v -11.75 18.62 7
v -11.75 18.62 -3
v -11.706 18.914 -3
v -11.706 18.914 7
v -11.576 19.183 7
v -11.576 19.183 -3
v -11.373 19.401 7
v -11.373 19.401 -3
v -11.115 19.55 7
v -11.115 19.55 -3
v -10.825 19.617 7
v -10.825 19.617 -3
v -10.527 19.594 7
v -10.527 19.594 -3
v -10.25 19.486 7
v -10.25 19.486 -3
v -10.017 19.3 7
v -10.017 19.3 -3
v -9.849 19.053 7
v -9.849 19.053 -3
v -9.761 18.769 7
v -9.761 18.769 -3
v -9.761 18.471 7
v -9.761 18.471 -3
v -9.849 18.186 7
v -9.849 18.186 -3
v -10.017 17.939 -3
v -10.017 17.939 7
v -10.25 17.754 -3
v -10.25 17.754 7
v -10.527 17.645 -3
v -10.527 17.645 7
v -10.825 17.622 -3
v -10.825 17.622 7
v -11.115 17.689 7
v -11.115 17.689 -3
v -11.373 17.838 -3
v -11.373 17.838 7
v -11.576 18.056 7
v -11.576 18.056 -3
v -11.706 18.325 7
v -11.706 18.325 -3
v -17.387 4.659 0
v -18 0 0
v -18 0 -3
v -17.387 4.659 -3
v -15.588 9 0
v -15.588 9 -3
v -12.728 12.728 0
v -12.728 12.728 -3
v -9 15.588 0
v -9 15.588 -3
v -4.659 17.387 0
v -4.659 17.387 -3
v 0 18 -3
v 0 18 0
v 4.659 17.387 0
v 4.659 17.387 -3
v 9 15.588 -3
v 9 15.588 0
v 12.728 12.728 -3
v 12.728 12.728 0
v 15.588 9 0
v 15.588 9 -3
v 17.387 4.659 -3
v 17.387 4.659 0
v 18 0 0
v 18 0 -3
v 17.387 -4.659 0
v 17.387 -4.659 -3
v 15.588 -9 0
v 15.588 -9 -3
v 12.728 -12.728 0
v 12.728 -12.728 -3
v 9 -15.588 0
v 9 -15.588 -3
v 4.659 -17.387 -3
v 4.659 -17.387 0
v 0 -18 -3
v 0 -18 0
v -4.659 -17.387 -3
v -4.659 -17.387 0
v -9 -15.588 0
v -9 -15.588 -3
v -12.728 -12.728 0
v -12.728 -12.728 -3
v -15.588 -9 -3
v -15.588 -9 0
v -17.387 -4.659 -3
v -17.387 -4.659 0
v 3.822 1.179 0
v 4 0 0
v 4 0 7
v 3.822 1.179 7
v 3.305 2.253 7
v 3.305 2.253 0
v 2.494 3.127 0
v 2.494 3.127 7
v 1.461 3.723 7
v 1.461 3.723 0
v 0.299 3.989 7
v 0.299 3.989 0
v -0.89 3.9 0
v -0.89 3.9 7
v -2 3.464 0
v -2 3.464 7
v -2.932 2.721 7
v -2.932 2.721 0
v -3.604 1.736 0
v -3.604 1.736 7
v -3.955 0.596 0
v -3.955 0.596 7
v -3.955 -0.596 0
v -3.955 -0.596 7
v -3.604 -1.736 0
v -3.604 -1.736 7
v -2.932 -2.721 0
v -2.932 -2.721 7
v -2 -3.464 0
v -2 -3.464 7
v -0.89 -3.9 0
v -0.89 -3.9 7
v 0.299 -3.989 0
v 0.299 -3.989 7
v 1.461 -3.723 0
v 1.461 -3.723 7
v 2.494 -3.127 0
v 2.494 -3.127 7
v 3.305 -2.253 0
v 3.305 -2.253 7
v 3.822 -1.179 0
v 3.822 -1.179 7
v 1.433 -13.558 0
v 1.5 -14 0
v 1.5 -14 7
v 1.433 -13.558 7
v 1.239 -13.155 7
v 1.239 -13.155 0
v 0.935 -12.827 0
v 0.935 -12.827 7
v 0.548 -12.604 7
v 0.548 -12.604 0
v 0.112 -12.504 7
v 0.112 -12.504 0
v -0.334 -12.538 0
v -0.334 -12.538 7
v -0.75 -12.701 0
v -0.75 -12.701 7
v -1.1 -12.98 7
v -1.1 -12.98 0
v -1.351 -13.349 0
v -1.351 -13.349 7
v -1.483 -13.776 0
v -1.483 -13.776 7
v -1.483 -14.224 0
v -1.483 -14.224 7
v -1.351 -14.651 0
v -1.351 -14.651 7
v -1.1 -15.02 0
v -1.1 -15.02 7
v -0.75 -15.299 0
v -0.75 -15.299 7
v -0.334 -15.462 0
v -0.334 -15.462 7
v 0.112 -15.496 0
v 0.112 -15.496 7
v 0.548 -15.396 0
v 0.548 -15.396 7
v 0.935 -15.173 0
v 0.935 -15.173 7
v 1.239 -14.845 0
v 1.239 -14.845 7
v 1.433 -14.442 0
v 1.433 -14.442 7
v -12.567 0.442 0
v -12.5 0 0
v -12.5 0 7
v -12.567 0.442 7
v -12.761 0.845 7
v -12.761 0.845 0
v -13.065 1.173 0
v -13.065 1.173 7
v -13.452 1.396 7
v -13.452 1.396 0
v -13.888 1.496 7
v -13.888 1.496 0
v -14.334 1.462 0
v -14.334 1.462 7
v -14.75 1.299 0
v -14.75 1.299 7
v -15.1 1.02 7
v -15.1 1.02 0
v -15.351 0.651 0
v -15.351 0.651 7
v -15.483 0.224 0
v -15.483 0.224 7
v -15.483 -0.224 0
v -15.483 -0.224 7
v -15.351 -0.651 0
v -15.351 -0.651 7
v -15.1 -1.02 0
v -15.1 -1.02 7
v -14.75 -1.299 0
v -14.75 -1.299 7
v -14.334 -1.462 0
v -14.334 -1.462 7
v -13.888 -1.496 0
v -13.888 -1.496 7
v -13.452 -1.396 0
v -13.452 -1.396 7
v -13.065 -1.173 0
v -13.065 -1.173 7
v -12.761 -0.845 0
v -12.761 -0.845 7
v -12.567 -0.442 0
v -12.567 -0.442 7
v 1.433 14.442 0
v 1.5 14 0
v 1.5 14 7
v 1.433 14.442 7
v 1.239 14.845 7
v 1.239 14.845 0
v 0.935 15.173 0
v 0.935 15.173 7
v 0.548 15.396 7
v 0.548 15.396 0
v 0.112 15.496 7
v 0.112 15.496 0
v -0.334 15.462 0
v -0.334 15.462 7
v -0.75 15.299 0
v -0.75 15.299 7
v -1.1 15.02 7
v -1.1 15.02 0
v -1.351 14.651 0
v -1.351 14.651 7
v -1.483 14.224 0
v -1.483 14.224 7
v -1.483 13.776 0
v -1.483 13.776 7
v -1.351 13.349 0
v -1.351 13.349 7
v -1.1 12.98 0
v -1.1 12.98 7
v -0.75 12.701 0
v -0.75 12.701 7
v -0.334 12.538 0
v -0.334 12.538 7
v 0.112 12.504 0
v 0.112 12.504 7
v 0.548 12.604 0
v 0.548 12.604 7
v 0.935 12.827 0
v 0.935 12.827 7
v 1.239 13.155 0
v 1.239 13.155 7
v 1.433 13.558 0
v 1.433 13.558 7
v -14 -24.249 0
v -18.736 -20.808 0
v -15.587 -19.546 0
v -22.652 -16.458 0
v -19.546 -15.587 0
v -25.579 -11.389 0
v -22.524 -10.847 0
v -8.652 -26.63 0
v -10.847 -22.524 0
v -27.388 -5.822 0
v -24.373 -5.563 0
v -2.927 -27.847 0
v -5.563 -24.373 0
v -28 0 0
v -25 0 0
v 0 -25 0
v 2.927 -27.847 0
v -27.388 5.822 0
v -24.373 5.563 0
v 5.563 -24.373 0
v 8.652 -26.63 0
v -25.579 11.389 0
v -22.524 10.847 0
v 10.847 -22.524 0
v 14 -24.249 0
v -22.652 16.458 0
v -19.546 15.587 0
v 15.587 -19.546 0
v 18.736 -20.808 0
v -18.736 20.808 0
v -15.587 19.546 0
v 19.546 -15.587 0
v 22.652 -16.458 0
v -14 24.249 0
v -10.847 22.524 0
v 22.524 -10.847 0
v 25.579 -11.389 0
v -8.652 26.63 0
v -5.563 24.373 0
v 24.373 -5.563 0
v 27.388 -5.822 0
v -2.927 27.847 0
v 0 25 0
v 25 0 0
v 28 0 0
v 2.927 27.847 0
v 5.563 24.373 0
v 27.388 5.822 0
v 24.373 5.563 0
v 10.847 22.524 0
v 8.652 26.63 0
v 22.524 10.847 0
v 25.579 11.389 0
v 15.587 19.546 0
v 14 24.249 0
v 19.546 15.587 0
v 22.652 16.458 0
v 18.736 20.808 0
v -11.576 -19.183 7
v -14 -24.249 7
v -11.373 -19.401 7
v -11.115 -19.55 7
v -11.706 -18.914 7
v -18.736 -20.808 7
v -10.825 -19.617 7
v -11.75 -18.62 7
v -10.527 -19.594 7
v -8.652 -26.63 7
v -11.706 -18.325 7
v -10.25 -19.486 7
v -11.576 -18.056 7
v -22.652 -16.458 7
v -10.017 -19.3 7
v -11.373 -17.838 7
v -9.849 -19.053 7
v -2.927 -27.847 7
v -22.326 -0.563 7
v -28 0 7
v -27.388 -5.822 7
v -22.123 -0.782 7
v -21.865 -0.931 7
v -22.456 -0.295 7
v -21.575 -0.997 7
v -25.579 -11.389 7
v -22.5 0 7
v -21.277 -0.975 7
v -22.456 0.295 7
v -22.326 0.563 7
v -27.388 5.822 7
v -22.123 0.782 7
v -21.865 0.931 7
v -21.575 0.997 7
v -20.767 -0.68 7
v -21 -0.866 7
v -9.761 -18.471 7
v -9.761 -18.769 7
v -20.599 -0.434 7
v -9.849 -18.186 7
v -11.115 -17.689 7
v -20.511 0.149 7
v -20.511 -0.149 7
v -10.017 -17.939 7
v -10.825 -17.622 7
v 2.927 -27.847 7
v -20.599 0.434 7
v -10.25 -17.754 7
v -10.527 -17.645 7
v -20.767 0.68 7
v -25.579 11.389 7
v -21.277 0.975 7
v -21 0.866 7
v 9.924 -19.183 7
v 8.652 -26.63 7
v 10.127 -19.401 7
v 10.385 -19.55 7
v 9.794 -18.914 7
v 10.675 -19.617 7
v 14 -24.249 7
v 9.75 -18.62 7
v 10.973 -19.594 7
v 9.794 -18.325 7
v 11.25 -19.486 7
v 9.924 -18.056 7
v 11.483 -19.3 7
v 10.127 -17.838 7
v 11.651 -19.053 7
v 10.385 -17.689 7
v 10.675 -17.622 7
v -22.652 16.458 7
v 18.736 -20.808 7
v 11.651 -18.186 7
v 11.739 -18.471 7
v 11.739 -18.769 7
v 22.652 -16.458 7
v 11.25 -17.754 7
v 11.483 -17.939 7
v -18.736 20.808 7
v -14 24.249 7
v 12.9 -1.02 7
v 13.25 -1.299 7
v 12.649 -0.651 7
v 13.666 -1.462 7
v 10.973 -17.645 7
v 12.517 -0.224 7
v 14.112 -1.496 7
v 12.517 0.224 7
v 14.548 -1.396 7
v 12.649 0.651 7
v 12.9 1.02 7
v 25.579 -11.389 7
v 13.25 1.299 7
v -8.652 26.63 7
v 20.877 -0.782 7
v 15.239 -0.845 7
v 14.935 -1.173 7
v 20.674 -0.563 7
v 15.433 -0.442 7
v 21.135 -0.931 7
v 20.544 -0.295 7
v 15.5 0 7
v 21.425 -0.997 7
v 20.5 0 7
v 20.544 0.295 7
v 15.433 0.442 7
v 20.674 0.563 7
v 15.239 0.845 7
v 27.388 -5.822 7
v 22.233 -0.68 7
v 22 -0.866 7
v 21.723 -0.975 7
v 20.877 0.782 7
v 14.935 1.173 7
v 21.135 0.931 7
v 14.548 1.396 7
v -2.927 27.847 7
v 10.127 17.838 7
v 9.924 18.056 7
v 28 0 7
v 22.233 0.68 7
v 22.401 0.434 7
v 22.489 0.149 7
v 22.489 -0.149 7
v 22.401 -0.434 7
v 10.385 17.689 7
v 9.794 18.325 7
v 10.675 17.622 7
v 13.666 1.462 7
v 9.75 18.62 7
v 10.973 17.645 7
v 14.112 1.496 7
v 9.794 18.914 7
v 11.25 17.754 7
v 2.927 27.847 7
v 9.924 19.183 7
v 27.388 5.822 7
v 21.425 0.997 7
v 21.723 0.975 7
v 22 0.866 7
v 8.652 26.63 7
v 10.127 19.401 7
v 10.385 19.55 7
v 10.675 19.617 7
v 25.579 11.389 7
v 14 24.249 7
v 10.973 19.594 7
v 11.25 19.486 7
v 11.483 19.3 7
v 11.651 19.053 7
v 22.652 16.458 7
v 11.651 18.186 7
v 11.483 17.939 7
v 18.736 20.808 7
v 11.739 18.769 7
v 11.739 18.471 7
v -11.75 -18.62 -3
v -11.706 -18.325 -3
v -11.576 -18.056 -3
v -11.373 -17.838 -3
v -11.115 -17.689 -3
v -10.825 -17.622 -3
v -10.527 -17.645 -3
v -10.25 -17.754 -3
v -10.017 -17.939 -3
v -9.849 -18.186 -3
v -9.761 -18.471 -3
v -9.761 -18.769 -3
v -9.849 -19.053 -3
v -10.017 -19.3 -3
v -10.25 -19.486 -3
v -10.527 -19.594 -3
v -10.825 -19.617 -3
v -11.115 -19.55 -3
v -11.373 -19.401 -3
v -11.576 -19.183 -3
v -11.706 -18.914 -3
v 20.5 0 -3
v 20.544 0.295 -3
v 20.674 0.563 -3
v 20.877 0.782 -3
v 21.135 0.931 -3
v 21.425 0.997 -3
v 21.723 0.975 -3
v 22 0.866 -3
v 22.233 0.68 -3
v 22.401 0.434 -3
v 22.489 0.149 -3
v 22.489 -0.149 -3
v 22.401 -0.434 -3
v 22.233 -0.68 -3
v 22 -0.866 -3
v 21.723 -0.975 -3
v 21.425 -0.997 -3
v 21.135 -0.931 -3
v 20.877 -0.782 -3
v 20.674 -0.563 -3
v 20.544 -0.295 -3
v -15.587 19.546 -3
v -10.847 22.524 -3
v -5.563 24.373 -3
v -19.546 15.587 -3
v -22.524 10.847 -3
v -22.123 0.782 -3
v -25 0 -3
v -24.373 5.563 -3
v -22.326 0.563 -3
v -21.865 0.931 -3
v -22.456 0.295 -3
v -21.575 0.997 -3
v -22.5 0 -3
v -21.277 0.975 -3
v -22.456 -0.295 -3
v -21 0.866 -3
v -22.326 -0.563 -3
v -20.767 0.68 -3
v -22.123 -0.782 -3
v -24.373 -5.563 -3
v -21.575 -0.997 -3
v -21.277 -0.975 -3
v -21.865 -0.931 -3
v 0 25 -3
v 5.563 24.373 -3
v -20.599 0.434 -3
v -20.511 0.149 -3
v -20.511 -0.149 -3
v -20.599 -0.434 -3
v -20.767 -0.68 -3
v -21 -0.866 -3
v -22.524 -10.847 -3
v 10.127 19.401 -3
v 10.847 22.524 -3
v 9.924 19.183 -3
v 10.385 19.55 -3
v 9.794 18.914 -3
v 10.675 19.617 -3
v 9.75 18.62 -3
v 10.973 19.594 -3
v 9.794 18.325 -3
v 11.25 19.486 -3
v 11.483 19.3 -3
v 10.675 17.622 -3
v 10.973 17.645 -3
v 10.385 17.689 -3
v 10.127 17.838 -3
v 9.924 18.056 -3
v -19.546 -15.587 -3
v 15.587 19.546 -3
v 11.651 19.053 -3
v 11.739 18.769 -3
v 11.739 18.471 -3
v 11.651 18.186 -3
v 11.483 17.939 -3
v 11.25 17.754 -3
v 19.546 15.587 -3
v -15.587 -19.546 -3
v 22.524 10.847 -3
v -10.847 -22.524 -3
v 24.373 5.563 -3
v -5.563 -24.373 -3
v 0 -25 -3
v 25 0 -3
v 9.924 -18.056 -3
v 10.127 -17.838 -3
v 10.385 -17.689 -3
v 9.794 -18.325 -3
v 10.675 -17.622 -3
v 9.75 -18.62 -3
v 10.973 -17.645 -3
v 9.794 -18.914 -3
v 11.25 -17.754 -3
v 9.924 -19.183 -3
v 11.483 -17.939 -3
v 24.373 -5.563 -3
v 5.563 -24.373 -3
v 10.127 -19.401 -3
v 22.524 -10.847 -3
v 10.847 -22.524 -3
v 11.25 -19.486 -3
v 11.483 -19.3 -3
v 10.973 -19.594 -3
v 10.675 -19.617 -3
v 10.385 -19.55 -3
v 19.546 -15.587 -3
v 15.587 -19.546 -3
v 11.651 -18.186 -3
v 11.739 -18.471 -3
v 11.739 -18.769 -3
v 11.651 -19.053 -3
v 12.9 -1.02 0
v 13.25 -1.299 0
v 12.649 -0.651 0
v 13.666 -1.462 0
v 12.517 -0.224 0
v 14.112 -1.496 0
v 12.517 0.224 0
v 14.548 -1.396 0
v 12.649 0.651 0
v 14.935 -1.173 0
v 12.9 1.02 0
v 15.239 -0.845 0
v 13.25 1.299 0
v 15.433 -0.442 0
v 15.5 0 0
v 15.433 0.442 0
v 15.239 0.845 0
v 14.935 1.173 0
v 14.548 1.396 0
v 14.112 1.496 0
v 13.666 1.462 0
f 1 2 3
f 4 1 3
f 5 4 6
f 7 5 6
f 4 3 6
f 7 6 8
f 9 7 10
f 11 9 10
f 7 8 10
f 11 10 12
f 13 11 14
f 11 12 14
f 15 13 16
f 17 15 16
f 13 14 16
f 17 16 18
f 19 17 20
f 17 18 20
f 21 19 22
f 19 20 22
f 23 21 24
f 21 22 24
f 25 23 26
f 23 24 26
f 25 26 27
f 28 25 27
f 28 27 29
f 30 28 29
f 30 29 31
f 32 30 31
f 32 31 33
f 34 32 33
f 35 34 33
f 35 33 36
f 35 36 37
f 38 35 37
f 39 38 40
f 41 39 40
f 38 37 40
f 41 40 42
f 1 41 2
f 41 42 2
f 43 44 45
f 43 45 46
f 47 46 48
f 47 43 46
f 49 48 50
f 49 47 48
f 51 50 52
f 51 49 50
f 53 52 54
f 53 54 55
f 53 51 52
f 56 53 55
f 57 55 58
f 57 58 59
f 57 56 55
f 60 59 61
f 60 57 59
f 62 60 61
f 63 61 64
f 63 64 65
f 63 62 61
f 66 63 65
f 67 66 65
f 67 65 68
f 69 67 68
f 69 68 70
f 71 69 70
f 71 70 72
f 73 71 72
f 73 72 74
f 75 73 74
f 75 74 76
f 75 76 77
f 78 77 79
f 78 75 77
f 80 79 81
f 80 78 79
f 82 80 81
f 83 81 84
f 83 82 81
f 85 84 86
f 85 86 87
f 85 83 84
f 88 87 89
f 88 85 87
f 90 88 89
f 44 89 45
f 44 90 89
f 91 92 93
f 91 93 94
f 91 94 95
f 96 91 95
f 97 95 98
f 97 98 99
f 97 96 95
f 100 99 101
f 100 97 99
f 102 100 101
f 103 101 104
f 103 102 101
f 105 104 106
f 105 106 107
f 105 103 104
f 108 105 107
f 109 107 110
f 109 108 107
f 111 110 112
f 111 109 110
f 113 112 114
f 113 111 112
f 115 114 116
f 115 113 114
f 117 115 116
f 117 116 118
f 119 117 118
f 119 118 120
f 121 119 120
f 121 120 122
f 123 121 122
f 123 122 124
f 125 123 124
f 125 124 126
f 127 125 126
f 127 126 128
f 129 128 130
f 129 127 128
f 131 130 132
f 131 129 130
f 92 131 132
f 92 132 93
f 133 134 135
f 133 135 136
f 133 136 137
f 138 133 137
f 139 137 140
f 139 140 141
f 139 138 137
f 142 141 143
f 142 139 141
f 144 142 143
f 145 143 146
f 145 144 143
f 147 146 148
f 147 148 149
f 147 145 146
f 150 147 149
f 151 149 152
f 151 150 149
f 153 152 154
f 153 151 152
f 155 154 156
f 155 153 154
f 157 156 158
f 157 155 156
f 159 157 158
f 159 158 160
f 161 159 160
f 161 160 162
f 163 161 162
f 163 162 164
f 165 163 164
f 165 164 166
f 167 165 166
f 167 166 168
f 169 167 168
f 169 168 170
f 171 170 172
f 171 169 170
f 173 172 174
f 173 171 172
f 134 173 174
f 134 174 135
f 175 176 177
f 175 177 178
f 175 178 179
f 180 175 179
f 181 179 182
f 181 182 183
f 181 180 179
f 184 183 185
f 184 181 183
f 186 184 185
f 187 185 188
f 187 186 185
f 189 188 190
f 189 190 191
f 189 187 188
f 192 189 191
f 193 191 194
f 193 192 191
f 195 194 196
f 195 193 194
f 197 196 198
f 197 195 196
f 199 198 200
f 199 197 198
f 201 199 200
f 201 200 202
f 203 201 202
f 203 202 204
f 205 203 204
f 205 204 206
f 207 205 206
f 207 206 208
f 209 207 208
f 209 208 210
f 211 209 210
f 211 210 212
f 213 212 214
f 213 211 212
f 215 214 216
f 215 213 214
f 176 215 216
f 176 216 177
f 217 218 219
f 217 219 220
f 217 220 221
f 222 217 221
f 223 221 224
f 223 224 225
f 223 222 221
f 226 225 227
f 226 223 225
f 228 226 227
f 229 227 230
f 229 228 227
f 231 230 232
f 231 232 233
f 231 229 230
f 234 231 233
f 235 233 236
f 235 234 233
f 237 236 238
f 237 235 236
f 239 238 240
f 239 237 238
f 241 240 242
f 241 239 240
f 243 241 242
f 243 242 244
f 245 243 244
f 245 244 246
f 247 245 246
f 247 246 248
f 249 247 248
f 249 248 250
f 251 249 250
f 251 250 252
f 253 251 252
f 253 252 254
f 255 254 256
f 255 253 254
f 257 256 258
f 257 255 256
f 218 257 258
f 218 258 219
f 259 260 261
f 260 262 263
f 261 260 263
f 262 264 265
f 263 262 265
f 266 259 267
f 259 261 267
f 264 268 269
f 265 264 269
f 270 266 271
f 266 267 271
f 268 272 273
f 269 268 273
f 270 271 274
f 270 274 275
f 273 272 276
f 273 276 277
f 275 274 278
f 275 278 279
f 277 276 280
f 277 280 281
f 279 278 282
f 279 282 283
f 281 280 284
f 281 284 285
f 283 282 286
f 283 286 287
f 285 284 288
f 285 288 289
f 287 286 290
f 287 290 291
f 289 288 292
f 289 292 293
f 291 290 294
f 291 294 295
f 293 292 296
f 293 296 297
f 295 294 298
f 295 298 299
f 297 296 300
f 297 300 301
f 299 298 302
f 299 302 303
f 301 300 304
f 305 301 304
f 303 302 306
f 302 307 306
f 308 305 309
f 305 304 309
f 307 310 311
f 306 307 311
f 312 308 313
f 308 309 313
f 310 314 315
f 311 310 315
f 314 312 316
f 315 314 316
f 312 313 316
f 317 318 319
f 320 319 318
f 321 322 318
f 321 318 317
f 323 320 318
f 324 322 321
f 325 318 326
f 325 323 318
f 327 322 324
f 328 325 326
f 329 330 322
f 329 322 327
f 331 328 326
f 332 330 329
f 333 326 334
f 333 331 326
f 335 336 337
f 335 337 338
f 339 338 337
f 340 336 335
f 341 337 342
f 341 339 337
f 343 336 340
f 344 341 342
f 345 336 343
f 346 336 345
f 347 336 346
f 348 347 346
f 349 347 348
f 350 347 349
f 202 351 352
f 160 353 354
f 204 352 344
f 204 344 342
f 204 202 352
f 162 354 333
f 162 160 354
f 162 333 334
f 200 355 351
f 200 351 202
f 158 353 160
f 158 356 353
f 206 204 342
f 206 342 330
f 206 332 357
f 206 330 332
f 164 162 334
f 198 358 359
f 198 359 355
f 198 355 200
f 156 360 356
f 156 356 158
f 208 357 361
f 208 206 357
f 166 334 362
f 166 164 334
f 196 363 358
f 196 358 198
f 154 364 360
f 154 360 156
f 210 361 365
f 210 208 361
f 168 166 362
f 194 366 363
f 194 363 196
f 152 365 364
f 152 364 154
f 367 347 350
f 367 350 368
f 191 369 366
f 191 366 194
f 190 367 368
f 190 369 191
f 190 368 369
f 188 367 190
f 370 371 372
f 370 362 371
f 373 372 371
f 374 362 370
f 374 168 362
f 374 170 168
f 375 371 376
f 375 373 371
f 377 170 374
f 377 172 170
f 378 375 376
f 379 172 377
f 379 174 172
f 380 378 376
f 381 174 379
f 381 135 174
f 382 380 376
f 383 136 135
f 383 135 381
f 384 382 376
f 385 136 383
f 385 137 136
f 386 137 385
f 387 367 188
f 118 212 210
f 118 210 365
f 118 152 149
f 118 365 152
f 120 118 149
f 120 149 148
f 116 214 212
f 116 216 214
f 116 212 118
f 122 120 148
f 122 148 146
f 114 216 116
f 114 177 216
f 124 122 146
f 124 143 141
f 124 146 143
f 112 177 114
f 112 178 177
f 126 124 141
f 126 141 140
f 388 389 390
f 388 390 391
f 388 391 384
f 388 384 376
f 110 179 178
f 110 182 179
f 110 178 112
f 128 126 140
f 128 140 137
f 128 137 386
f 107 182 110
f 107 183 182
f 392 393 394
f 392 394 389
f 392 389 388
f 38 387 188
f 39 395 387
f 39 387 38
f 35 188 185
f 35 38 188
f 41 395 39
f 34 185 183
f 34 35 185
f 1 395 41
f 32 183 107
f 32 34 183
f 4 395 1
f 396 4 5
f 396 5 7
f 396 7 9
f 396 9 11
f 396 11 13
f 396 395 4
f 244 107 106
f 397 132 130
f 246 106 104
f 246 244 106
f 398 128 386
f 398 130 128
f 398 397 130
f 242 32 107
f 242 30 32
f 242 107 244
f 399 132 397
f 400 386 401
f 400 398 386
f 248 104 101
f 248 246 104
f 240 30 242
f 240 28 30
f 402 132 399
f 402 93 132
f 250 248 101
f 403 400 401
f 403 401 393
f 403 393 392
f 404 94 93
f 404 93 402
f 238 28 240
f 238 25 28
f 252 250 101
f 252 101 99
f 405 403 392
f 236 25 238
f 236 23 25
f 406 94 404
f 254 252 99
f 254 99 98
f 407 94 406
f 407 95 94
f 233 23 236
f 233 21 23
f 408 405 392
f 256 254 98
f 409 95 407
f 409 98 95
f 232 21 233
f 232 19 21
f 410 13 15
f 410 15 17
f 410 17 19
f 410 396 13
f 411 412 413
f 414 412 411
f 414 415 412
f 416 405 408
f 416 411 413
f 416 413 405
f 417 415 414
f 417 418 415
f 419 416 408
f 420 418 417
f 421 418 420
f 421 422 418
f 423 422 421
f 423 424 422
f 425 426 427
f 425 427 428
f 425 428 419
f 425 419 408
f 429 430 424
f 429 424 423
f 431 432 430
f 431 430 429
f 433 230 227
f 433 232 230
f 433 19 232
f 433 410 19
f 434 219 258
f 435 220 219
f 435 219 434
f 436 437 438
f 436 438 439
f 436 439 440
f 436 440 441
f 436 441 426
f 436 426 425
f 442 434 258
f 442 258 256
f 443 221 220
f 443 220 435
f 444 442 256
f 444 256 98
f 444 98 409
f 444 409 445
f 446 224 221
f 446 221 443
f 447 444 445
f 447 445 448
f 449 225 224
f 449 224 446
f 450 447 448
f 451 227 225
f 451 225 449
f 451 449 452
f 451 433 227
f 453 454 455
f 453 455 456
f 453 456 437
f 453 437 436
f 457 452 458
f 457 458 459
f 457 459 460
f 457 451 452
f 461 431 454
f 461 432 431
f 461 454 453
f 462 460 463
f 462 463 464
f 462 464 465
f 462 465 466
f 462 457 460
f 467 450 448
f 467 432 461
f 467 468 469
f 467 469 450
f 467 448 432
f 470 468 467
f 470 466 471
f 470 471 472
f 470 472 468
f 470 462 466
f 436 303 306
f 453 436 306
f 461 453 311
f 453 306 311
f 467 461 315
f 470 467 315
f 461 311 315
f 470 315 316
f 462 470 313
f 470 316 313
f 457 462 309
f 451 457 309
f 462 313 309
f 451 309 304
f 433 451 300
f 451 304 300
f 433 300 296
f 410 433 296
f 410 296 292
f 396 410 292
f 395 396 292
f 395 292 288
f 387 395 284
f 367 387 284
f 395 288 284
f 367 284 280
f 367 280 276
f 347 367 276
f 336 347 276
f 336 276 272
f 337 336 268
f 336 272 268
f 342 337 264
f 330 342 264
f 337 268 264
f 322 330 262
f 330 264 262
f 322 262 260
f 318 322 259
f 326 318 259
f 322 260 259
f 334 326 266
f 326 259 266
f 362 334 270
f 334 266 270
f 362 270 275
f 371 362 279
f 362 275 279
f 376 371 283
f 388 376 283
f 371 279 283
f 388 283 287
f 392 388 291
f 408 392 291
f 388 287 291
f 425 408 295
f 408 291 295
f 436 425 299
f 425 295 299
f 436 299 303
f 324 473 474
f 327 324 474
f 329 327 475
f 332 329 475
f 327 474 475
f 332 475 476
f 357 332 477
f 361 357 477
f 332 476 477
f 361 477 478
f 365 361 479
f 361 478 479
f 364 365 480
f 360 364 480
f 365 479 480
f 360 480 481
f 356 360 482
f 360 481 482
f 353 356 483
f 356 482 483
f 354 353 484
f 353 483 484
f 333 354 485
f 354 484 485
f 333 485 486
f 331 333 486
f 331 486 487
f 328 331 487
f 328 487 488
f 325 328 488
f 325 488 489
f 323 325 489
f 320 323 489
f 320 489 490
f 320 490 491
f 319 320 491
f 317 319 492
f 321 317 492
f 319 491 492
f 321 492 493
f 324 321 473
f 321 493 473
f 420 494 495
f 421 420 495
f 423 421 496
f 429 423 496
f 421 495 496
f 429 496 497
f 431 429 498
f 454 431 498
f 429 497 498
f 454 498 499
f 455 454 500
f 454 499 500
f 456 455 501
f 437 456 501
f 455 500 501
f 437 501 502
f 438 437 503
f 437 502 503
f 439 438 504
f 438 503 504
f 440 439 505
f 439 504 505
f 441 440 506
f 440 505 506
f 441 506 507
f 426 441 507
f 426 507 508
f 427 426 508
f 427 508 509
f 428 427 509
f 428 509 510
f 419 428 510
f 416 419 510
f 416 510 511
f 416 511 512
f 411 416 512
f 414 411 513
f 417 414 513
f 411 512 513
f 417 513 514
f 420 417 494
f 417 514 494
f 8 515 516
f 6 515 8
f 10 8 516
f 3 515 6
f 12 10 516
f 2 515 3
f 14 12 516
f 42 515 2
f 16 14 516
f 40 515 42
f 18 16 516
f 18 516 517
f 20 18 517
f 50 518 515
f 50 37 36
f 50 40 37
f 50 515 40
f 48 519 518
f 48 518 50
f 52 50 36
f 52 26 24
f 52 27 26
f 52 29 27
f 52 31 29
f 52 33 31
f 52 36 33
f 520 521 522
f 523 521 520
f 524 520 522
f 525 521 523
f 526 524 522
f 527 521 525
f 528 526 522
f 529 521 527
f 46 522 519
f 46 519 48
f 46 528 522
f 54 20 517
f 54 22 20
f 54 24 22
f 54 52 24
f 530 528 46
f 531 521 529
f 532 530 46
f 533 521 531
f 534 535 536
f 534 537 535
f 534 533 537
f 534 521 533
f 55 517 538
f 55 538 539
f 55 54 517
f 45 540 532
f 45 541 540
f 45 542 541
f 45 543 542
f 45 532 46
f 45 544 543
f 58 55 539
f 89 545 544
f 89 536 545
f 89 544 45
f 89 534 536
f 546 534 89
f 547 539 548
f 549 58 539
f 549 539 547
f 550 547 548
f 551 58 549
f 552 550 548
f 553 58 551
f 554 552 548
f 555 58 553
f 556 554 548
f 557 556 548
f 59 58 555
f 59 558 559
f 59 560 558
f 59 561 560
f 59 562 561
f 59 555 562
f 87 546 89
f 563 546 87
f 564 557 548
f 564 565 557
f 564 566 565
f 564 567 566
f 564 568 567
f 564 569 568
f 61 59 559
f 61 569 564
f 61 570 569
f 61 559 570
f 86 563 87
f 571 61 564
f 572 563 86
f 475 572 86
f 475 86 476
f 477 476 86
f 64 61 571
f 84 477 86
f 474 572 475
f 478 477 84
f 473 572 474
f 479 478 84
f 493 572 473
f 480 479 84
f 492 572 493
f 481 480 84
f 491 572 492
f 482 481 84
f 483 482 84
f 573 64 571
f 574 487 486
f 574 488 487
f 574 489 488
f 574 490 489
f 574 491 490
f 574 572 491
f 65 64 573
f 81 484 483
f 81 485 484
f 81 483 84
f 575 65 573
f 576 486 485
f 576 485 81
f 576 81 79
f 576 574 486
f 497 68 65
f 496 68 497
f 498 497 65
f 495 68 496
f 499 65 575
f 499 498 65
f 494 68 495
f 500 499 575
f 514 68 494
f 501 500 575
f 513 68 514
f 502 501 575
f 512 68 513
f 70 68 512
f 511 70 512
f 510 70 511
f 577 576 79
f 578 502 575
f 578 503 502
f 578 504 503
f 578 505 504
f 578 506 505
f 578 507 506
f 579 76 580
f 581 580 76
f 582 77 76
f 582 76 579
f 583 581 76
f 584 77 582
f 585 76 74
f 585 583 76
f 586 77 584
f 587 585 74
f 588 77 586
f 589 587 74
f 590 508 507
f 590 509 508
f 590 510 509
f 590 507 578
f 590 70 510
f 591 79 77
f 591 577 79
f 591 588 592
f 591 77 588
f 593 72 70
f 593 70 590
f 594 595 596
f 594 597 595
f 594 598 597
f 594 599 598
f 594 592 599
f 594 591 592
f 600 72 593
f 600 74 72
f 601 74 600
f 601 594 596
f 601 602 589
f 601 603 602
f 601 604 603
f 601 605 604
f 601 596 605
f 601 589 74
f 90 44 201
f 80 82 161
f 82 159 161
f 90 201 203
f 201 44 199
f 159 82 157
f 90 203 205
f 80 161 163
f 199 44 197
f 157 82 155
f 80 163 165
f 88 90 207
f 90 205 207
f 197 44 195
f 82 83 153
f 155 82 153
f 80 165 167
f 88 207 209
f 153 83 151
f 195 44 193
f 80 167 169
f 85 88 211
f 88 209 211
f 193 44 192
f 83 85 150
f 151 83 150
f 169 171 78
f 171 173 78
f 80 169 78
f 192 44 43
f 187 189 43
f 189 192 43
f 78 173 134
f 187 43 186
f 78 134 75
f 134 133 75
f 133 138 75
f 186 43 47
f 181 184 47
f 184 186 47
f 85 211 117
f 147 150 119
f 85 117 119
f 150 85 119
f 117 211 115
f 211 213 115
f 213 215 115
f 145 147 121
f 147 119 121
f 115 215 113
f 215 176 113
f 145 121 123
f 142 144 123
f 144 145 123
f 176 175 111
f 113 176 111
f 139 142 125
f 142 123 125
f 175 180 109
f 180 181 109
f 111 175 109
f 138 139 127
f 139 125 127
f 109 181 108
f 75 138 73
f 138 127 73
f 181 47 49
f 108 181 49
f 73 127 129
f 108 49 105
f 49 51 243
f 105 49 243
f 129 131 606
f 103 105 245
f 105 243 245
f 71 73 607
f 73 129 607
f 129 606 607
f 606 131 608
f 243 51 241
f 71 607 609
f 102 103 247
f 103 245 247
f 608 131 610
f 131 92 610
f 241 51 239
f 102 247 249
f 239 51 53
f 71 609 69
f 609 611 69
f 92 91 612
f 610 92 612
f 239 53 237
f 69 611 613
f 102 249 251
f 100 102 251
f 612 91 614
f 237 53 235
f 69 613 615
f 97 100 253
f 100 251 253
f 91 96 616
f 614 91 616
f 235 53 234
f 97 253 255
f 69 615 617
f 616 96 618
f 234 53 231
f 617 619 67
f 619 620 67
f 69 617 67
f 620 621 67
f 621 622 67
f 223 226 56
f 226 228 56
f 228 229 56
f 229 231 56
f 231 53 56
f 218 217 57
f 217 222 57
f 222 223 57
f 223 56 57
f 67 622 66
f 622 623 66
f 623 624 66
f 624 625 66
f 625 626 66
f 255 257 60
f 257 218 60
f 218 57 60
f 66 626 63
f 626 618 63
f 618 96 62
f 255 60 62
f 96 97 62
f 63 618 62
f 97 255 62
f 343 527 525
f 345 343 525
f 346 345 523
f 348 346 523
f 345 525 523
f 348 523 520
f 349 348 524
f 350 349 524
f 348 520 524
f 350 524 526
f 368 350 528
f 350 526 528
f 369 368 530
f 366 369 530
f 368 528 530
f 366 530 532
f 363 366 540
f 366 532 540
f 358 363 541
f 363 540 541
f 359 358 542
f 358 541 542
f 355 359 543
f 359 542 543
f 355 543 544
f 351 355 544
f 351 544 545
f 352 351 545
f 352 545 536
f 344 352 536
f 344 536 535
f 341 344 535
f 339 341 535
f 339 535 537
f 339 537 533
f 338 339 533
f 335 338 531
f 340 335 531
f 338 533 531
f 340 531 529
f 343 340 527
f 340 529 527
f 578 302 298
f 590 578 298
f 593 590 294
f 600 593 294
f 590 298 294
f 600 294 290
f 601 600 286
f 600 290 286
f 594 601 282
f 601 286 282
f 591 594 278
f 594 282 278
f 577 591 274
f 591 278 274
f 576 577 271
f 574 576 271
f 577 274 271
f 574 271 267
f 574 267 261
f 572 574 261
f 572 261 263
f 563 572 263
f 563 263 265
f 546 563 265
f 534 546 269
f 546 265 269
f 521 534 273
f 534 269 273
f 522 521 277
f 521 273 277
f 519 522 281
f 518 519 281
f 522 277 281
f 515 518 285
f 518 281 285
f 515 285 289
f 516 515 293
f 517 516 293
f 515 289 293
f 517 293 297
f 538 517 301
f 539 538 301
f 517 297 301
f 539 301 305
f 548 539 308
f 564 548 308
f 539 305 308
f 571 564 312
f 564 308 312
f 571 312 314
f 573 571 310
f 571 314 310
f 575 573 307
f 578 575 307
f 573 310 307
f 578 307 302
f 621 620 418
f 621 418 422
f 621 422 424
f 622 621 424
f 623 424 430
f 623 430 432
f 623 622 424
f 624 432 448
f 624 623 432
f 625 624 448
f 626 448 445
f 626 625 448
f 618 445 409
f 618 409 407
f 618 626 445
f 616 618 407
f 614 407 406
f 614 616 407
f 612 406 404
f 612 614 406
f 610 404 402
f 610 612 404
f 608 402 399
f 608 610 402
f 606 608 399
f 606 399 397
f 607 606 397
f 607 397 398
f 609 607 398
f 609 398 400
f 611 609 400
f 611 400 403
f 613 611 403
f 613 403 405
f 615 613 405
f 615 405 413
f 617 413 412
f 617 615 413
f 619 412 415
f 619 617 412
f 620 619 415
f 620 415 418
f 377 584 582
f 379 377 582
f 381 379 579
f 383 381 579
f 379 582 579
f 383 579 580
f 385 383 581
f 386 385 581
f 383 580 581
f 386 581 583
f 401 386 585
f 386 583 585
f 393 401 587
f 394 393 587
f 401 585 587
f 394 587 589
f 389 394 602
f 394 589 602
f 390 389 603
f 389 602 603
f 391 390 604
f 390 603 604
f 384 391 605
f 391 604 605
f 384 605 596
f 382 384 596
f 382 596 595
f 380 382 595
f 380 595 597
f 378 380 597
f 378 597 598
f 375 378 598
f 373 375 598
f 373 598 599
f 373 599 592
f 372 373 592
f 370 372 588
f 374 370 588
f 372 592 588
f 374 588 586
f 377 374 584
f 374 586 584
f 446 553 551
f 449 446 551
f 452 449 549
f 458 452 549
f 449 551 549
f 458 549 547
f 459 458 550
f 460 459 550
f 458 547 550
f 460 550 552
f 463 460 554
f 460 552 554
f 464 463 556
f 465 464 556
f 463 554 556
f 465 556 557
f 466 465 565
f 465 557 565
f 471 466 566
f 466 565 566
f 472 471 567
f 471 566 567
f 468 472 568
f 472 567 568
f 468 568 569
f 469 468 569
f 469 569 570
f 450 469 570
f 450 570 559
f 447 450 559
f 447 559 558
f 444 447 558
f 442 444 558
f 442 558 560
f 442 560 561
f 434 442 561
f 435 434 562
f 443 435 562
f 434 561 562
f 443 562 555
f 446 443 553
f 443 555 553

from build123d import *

# Parameters (mm, degrees)
SKETCH1_R           = 28
SKETCH1_R_2         = 4
SKETCH1_R_3         = 1.5
BOSS_EXTRUDE1_DEPTH = 7
SKETCH2_R           = 25
SKETCH2_R_2         = 18
BOSS_EXTRUDE2_DEPTH = 3
SKETCH3_R           = 1
CUT_EXTRUDE1_DEPTH  = 10


with BuildPart() as part:
    # Sketch1 → Boss-Extrude1 (new body)
    with BuildSketch(Plane.XY):
        Circle(SKETCH1_R)
        Circle(SKETCH1_R_2, mode=Mode.SUBTRACT)
        with Locations((0, 14)):
            Circle(SKETCH1_R_3, mode=Mode.SUBTRACT)
        with Locations((14, 0)):
            Circle(SKETCH1_R_3, mode=Mode.SUBTRACT)
        with Locations((0, -14)):
            Circle(SKETCH1_R_3, mode=Mode.SUBTRACT)
        with Locations((-14, 0)):
            Circle(SKETCH1_R_3, mode=Mode.SUBTRACT)
    extrude(amount=BOSS_EXTRUDE1_DEPTH)

    # Sketch2 → Boss-Extrude2 (add)
    with BuildSketch(Plane(origin=(0, 0, 0), x_dir=(-1, 0, 0), z_dir=(0, 0, -1))):
        with Locations(Location((0, 0, 0), (0, 0, 180))):
            Circle(SKETCH2_R)
        Circle(SKETCH2_R_2, mode=Mode.SUBTRACT)
    extrude(amount=BOSS_EXTRUDE2_DEPTH)

    # Sketch3 → Cut-Extrude1 (cut)
    with BuildSketch(Plane(origin=(0, 0, -3), x_dir=(-1, 0, 0), z_dir=(0, 0, -1))):
        with Locations((-10.75, 18.619546181)):
            Circle(SKETCH3_R)
        with Locations((10.75, 18.619546181)):
            Circle(SKETCH3_R)
        with Locations((21.5, 0)):
            Circle(SKETCH3_R)
        with Locations((10.75, -18.619546181)):
            Circle(SKETCH3_R)
        with Locations((-10.75, -18.619546181)):
            Circle(SKETCH3_R)
        with Locations((-21.5, 0)):
            Circle(SKETCH3_R)
    extrude(amount=-CUT_EXTRUDE1_DEPTH, mode=Mode.SUBTRACT)


solid = part.part
